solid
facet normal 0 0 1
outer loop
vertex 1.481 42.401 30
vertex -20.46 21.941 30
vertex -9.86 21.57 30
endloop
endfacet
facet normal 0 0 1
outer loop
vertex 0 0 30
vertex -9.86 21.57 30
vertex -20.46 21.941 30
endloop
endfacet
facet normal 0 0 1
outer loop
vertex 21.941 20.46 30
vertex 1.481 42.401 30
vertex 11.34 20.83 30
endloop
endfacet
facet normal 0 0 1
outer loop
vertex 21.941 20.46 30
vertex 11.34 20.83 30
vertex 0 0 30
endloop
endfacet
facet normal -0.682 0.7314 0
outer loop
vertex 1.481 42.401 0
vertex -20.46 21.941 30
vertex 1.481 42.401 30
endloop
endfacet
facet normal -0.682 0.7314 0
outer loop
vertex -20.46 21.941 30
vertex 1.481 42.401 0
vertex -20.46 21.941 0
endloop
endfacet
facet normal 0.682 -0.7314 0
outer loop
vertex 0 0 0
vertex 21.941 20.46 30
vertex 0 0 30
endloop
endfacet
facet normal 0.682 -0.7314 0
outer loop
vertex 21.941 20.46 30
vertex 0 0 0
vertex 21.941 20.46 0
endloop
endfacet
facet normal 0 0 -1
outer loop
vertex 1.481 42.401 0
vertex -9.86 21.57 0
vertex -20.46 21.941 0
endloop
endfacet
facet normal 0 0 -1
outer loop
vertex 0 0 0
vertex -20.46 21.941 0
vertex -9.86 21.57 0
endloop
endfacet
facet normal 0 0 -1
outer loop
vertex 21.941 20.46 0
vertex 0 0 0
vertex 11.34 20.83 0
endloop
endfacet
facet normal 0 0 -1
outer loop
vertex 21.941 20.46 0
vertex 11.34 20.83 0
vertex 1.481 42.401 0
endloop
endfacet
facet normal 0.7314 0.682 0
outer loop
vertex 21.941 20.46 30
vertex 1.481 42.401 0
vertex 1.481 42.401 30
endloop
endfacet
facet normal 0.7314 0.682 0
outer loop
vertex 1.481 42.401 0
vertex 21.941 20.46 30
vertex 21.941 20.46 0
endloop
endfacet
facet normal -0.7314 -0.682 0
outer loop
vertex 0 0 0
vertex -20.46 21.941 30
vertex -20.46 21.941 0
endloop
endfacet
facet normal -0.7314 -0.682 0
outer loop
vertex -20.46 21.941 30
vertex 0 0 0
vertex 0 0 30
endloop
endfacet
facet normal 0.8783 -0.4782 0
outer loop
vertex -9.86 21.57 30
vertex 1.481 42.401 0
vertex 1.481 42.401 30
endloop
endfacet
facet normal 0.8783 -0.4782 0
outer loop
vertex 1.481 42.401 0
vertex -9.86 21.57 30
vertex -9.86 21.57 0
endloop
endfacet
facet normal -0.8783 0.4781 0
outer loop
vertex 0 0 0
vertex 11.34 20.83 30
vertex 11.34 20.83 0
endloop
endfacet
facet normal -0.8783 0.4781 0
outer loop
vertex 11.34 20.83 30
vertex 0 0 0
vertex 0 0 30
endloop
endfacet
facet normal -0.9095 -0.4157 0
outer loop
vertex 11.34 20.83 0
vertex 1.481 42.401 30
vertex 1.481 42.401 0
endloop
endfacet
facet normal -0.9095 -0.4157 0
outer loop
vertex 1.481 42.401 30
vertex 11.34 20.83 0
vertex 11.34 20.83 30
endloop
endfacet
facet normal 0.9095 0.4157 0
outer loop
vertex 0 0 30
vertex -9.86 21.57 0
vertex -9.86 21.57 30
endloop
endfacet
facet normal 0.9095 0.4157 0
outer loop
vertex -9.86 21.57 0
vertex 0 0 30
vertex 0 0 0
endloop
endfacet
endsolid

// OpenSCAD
rotate([0,0,-2])
rotate([0,-90,0]){
    difference(){
        rotate([-45,0,0]) {
            cube([30, 30, 30]);
        }
        scale([1,1,0.5]) {
            rotate([-45,0,0]) {
                cube([30, 30, 30]);
            }
        }
    }
}
